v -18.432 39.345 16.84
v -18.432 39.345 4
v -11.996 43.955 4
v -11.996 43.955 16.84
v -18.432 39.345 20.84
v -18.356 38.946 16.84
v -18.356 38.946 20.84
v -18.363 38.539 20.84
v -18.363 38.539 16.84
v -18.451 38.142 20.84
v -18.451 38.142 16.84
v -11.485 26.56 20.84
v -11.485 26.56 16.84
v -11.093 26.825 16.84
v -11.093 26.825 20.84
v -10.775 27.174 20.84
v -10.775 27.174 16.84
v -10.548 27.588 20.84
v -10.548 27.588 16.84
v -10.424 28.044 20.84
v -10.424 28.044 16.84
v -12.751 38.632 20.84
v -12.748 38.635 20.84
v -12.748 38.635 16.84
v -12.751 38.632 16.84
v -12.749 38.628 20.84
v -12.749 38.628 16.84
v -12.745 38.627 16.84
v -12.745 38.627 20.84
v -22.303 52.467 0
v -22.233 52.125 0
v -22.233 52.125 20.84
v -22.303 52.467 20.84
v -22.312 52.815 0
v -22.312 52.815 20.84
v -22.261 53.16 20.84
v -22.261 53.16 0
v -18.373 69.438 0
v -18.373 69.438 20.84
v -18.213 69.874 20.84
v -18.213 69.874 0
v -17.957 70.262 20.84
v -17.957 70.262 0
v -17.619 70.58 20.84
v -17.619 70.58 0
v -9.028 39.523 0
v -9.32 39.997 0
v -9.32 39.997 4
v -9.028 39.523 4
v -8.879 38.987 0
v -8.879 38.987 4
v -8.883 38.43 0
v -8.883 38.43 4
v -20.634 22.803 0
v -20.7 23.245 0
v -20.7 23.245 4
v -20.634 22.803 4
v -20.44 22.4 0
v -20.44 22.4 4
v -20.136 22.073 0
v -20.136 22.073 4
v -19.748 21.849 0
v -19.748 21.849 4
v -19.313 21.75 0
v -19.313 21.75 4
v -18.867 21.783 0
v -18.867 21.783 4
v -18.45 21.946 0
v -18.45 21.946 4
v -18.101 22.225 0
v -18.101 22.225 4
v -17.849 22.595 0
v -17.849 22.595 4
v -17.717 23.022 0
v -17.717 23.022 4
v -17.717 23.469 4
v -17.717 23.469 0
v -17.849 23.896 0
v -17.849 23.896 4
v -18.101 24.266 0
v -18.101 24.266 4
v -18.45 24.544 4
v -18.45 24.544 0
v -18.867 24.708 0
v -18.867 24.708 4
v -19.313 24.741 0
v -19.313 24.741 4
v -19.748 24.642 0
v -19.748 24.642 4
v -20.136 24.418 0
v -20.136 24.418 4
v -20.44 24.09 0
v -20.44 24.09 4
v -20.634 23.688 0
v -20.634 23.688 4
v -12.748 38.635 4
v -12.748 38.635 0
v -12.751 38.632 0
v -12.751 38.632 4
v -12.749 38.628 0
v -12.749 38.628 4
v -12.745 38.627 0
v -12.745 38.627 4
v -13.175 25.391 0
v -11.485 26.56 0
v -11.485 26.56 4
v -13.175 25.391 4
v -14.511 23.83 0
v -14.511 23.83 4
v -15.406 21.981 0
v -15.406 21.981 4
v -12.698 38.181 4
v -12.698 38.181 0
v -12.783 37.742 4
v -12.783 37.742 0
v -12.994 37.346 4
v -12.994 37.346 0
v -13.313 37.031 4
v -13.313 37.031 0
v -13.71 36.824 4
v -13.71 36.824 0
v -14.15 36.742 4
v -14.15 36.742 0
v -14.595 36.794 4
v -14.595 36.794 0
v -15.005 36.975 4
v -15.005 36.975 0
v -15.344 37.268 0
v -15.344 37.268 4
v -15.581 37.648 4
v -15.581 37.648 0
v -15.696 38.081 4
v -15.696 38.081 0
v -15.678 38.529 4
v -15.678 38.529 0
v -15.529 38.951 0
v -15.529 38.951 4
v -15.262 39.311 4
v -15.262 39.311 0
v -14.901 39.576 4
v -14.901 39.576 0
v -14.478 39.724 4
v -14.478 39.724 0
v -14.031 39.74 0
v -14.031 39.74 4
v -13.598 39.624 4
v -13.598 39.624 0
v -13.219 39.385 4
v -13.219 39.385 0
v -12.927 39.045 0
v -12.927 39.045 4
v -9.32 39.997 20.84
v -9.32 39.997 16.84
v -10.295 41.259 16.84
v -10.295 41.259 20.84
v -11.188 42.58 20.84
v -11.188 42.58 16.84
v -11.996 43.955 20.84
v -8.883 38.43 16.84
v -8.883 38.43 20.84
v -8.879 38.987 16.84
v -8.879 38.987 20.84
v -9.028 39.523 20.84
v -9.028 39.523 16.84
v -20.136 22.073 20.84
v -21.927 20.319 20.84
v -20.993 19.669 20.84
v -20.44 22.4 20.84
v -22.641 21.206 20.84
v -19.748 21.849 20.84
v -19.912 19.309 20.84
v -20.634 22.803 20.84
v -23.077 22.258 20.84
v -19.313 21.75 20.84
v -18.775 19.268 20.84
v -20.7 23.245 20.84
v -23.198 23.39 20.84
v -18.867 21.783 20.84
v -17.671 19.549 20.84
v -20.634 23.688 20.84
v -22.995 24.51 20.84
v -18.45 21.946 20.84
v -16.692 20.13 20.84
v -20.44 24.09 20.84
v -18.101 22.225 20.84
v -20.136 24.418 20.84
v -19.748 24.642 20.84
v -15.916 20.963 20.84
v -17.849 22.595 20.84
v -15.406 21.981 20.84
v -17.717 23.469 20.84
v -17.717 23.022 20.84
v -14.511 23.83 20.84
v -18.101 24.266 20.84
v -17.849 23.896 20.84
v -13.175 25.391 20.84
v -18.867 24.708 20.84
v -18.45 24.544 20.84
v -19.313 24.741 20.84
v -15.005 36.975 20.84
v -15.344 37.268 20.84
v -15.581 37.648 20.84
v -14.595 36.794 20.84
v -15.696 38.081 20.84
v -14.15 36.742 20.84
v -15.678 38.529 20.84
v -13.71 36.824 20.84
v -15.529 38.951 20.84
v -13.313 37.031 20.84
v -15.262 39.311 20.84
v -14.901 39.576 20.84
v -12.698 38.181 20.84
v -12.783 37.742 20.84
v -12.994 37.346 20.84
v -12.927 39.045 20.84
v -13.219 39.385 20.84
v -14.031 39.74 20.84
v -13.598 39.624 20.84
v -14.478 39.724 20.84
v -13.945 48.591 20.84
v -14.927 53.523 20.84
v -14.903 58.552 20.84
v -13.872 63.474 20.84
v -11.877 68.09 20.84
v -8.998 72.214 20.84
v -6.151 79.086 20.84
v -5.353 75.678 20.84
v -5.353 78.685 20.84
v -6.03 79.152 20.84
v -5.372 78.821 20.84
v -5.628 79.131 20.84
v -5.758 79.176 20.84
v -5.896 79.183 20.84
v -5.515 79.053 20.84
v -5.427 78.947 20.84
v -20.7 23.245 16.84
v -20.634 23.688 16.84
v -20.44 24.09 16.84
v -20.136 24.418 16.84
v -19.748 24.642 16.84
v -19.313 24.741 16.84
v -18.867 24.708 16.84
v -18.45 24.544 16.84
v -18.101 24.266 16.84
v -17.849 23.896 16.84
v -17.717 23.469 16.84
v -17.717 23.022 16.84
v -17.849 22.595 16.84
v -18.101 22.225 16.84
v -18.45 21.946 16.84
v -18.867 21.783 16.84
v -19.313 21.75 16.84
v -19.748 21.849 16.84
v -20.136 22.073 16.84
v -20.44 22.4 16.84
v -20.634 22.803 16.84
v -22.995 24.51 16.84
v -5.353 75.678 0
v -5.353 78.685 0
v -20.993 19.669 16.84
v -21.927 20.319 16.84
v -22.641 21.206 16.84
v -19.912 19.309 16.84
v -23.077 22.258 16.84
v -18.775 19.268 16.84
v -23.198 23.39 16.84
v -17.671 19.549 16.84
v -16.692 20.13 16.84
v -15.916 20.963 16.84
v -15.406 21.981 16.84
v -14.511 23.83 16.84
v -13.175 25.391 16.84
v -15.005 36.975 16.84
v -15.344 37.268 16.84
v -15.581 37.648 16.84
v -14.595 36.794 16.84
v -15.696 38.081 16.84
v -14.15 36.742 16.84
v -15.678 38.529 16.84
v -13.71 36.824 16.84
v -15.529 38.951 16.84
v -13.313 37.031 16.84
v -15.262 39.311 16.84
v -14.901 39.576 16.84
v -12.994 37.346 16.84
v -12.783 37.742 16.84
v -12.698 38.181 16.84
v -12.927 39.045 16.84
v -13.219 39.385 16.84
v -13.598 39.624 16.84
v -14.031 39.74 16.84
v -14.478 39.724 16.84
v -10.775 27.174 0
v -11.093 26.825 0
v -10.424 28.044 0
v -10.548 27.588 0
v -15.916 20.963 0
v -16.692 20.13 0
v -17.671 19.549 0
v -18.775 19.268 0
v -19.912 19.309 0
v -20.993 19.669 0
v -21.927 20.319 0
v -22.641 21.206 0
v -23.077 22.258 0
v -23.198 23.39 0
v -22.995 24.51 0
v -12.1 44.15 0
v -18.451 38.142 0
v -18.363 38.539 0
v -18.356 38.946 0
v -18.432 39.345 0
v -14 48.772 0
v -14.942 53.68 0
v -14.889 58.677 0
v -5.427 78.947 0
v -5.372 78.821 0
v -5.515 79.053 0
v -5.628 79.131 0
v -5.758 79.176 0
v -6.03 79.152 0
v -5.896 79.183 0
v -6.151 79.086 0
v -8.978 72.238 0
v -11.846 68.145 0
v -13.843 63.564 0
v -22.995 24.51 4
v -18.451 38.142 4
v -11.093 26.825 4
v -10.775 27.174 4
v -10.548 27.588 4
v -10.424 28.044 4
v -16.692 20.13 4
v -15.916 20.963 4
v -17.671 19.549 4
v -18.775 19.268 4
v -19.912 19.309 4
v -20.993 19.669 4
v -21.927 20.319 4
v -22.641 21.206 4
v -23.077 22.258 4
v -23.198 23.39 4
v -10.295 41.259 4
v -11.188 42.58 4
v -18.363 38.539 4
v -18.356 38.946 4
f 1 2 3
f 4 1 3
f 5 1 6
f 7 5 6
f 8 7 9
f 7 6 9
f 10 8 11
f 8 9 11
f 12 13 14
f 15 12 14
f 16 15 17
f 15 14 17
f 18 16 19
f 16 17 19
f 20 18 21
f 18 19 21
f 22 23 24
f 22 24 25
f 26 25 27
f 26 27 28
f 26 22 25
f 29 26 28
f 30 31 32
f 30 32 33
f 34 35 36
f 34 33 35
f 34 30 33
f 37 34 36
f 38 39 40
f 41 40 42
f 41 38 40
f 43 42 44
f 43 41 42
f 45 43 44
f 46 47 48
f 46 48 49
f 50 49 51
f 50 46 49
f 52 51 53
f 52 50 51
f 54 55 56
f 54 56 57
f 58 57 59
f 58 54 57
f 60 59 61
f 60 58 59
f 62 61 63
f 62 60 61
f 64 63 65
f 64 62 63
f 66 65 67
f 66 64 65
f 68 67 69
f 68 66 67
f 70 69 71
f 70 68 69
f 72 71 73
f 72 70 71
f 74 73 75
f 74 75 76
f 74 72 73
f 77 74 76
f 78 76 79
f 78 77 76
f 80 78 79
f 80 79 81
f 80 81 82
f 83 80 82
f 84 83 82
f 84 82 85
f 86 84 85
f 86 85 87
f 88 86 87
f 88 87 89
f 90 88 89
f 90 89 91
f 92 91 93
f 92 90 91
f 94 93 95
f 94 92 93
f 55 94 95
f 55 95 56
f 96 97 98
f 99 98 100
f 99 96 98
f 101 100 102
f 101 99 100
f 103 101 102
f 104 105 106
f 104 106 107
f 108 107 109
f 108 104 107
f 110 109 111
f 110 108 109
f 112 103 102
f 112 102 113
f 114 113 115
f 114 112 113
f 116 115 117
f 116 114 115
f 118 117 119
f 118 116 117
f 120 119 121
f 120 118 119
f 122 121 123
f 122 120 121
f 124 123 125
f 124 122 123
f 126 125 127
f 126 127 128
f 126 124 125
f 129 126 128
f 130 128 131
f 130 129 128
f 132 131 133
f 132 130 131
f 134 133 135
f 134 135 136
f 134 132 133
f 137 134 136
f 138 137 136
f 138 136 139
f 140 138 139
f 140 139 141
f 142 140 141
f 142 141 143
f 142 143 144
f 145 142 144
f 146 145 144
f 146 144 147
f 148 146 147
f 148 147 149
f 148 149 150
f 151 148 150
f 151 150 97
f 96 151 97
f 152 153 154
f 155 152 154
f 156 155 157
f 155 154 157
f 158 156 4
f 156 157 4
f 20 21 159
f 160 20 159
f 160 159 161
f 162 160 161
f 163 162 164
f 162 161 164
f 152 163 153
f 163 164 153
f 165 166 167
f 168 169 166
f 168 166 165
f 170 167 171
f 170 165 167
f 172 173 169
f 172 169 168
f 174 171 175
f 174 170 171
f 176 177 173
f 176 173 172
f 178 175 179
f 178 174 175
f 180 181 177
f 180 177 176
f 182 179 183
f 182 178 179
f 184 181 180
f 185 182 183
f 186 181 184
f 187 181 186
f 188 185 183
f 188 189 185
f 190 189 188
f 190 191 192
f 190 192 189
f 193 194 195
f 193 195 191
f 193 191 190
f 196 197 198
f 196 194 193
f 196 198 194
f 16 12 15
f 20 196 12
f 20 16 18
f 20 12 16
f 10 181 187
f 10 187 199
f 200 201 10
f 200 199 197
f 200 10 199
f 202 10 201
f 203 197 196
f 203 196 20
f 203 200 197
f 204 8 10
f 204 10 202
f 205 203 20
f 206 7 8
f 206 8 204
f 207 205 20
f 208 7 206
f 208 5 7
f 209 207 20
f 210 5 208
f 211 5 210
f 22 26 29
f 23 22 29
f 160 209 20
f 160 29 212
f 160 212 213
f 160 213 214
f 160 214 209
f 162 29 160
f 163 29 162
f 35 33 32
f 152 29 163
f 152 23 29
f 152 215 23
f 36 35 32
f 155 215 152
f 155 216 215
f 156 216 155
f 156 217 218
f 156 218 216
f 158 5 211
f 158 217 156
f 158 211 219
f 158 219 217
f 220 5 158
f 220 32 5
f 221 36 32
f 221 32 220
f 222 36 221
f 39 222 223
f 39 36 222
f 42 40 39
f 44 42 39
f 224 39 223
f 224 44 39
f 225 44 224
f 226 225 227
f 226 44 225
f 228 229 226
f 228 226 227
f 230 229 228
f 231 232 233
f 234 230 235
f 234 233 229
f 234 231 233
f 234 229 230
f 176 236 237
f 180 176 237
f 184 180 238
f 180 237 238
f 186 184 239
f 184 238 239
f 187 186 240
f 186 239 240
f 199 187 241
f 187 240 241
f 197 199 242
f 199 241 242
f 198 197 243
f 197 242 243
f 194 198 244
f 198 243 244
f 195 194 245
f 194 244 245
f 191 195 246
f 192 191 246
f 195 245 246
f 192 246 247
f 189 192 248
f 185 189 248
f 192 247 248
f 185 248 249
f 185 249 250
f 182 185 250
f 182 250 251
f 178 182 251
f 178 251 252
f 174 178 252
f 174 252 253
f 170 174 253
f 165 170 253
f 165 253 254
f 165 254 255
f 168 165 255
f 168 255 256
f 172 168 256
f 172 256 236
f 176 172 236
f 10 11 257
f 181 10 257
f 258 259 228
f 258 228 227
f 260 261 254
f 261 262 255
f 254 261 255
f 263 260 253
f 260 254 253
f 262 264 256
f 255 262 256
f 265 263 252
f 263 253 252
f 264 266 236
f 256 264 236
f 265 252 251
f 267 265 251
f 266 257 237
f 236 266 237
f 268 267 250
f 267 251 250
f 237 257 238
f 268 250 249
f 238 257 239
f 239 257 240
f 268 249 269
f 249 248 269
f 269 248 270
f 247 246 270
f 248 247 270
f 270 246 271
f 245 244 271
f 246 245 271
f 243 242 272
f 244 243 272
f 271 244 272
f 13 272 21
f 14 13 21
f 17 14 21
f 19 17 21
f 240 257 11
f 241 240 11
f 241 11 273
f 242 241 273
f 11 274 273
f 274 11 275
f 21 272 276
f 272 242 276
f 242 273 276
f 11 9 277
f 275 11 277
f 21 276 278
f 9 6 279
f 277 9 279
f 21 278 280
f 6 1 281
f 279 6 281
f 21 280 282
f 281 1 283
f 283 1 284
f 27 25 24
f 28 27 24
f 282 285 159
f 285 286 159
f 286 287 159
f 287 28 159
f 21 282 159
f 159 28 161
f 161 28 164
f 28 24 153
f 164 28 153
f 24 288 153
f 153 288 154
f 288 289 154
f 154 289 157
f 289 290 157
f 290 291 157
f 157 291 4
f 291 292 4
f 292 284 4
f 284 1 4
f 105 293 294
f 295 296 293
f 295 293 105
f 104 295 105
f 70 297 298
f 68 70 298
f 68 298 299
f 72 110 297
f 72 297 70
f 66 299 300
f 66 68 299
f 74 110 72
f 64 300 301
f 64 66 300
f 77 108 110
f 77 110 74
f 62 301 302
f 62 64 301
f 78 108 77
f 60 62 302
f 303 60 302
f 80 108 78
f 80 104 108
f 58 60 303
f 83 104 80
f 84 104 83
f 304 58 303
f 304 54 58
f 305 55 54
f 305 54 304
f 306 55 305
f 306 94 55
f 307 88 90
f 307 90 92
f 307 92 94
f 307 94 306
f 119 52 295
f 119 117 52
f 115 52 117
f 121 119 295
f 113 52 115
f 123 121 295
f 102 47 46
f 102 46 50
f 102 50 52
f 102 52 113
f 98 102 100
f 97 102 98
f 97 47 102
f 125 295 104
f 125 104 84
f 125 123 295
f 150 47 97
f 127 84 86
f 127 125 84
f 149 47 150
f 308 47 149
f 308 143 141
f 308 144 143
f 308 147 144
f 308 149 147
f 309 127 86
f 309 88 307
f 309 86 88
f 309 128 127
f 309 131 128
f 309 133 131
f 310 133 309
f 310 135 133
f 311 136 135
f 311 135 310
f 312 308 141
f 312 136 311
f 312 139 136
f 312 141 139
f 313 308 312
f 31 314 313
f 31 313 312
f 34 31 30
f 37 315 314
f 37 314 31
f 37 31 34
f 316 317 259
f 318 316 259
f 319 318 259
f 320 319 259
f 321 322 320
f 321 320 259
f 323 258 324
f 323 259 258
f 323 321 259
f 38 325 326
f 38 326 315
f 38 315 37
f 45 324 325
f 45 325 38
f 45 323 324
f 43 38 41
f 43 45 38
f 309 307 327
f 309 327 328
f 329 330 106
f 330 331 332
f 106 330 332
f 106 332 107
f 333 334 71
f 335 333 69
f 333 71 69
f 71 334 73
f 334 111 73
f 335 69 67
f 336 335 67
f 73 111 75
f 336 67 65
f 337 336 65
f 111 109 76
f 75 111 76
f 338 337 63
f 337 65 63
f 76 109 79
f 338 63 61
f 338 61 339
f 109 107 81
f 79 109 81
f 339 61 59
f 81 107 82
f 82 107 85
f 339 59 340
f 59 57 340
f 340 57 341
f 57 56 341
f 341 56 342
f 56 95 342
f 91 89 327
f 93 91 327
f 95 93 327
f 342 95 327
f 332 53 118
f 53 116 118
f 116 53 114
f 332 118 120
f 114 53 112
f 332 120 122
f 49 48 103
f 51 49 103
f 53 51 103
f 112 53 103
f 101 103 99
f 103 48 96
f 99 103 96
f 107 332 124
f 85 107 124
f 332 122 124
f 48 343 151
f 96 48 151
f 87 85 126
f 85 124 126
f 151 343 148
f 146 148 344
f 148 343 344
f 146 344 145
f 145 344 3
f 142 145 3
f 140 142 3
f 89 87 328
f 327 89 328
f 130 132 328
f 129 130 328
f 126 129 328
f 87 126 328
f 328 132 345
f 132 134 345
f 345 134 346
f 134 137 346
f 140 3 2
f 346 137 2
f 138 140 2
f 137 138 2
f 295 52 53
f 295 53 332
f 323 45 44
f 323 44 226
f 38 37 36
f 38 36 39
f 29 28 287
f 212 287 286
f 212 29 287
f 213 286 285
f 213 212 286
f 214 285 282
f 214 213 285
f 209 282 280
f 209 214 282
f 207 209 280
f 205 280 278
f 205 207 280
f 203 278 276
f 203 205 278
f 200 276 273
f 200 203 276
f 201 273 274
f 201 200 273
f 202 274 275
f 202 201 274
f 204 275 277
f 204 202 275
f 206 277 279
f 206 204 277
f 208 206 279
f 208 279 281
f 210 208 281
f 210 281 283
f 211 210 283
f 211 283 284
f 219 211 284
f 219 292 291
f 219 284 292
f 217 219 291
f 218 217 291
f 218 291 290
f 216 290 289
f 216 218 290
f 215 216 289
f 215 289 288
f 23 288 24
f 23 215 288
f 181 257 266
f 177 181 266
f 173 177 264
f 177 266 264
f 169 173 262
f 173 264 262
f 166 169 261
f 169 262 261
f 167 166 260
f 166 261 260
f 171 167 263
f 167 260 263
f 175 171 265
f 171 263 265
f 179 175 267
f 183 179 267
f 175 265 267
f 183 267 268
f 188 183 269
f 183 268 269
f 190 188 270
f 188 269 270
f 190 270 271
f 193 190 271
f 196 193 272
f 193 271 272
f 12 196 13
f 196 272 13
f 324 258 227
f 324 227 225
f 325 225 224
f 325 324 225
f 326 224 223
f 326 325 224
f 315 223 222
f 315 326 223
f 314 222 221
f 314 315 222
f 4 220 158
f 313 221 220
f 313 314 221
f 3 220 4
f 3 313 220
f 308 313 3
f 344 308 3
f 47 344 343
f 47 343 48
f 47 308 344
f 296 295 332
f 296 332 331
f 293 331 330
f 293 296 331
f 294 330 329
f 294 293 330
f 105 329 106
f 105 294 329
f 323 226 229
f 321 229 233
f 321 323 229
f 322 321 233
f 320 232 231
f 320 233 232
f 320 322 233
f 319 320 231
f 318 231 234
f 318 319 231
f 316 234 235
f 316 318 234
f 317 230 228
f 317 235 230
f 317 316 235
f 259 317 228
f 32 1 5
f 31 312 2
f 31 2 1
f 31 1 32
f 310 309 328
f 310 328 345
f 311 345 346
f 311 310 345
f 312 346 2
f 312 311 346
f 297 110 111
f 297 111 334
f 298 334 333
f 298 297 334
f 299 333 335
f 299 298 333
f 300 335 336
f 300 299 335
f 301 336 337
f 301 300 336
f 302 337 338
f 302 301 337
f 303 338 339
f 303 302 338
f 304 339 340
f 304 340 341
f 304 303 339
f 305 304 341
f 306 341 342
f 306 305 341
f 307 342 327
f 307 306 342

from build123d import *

# Parameters (mm, degrees)
SKETCH_1_R          = 1.5
EXTRUDE_1_DEPTH     = 4
EXTRUDE_2_DEPTH     = 20.84
EXTRUDE_START       = -4
EXTRUDE_3_DEPTH     = 4
CUT_EXTRUDE_1_DEPTH = 86.104469456
SKETCH_15_R         = 1.5
CUT_EXTRUDE_2_DEPTH = 86.104469456


with BuildPart() as part:
    # 草图1 → 凸台-拉伸1 (new body)
    with BuildSketch(Plane.XY):
        with BuildLine():
            Line((-8.883361298, 38.430372232), (-10.42356995, 28.043950456))
            ThreePointArc((-10.42356995, 28.043950456), (-10.775128008, 27.17392517), (-11.484802252, 26.560003729))
            ThreePointArc((-11.484802252, 26.560003729), (-13.893149851, 24.653752275), (-15.405733358, 21.980547476))
            ThreePointArc((-15.405733358, 21.980547476), (-20.465380085, 19.450724806), (-22.995202754, 24.510371532))
            Line((-22.995202754, 24.510371532), (-18.451197233, 38.142383115))
            ThreePointArc((-18.451197233, 38.142383115), (-18.348830032, 38.742204214), (-18.431570381, 39.345046174))
            Line((-18.431570381, 39.345046174), (-22.233001172, 52.125165651))
            ThreePointArc((-22.233001172, 52.125165651), (-22.31526172, 52.64074939), (-22.261276417, 53.160055635))
            Line((-22.261276417, 53.160055635), (-18.372774426, 69.438220218))
            ThreePointArc((-18.372774426, 69.438220218), (-18.096529541, 70.075517478), (-17.618975762, 70.579899696))
            Line((-17.618975762, 70.579899696), (-6.150614111, 79.086205979))
            ThreePointArc((-6.150614111, 79.086205979), (-5.627950875, 79.131232586), (-5.352746621, 78.684615443))
            Line((-5.352746621, 78.684615443), (-5.352746621, 75.677999772))
            ThreePointArc((-5.352746621, 75.677999772), (-14.888864346, 58.677248629), (-9.31952103, 39.997165768))
            ThreePointArc((-9.31952103, 39.997165768), (-8.934989705, 39.260105305), (-8.883361298, 38.430372232))
        make_face()
        with Locations((-19.200468056, 23.245459504)):
            Circle(SKETCH_1_R, mode=Mode.SUBTRACT)
        with Locations((-14.200468056, 38.245459504)):
            Circle(SKETCH_1_R, mode=Mode.SUBTRACT)
    extrude(amount=EXTRUDE_1_DEPTH)

    # 草图9 → 凸台-拉伸2 (add)
    with BuildSketch(Plane(origin=(0, 0, 0), x_dir=(-1, 0, 0), z_dir=(0, 0, -1))):
        with BuildLine():
            Line((18.431570381, 39.345046174), (11.995527079, 43.954984078))
            ThreePointArc((11.995527079, 43.954984078), (14.51123125, 61.038775991), (5.352746621, 75.677999772))
            Line((5.352746621, 75.677999772), (5.352746621, 78.684615443))
            ThreePointArc((5.352746621, 78.684615443), (5.627950875, 79.131232586), (6.150614111, 79.086205979))
            Line((6.150614111, 79.086205979), (17.618975762, 70.579899696))
            ThreePointArc((17.618975762, 70.579899696), (18.096529541, 70.075517478), (18.372774426, 69.438220218))
            Line((18.372774426, 69.438220218), (22.261276417, 53.160055635))
            ThreePointArc((22.261276417, 53.160055635), (22.31526172, 52.64074939), (22.233001172, 52.125165651))
            Line((22.233001172, 52.125165651), (18.431570381, 39.345046174))
        make_face()
    extrude(amount=-EXTRUDE_2_DEPTH)

    # 草图13 → 凸台-拉伸3 (add)
    with BuildSketch(Plane.XY.offset(20.84).offset(EXTRUDE_START)):
        with BuildLine():
            Line((-11.995527079, 43.954984078), (-18.431570381, 39.345046174))
            ThreePointArc((-18.431570381, 39.345046174), (-18.348830032, 38.742204214), (-18.451197233, 38.142383115))
            Line((-18.451197233, 38.142383115), (-22.995202754, 24.510371532))
            ThreePointArc((-22.995202754, 24.510371532), (-20.465380085, 19.450724806), (-15.405733358, 21.980547476))
            ThreePointArc((-15.405733358, 21.980547476), (-13.893149851, 24.653752275), (-11.484802252, 26.560003729))
            ThreePointArc((-11.484802252, 26.560003729), (-10.775128008, 27.17392517), (-10.42356995, 28.043950456))
            Line((-10.42356995, 28.043950456), (-8.883361298, 38.430372232))
            ThreePointArc((-8.883361298, 38.430372232), (-8.934989705, 39.260105305), (-9.31952103, 39.997165768))
            ThreePointArc((-9.31952103, 39.997165768), (-10.752284945, 41.91200409), (-11.995527079, 43.954984078))
        make_face()
    extrude(amount=EXTRUDE_3_DEPTH)

    # 草图14 → 切除-拉伸1 (cut, through all)
    with BuildSketch(Plane(origin=(0, 0, 0), x_dir=(-1, 0, 0), z_dir=(0, 0, -1))):
        with BuildLine():
            ThreePointArc((12.747581778, 38.634879176), (12.74980353, 38.633349016), (12.750658691, 38.630790447))
            ThreePointArc((12.750658691, 38.630790447), (12.749034684, 38.627446317), (12.745402307, 38.62665484))
            ThreePointArc((12.745402307, 38.62665484), (14.00829556, 36.753616366), (15.704637667, 38.245459504))
            ThreePointArc((15.704637667, 38.245459504), (14.396859032, 39.736753171), (12.747581778, 38.634879176))
        make_face()
    extrude(amount=-CUT_EXTRUDE_1_DEPTH, mode=Mode.SUBTRACT)

    # 草图15 → 切除-拉伸2 (cut, through all)
    with BuildSketch(Plane(origin=(0, 0, 0), x_dir=(-1, 0, 0), z_dir=(0, 0, -1))):
        with Locations((19.200468056, 23.245459504)):
            Circle(SKETCH_15_R)
    extrude(amount=-CUT_EXTRUDE_2_DEPTH, mode=Mode.SUBTRACT)


solid = part.part
